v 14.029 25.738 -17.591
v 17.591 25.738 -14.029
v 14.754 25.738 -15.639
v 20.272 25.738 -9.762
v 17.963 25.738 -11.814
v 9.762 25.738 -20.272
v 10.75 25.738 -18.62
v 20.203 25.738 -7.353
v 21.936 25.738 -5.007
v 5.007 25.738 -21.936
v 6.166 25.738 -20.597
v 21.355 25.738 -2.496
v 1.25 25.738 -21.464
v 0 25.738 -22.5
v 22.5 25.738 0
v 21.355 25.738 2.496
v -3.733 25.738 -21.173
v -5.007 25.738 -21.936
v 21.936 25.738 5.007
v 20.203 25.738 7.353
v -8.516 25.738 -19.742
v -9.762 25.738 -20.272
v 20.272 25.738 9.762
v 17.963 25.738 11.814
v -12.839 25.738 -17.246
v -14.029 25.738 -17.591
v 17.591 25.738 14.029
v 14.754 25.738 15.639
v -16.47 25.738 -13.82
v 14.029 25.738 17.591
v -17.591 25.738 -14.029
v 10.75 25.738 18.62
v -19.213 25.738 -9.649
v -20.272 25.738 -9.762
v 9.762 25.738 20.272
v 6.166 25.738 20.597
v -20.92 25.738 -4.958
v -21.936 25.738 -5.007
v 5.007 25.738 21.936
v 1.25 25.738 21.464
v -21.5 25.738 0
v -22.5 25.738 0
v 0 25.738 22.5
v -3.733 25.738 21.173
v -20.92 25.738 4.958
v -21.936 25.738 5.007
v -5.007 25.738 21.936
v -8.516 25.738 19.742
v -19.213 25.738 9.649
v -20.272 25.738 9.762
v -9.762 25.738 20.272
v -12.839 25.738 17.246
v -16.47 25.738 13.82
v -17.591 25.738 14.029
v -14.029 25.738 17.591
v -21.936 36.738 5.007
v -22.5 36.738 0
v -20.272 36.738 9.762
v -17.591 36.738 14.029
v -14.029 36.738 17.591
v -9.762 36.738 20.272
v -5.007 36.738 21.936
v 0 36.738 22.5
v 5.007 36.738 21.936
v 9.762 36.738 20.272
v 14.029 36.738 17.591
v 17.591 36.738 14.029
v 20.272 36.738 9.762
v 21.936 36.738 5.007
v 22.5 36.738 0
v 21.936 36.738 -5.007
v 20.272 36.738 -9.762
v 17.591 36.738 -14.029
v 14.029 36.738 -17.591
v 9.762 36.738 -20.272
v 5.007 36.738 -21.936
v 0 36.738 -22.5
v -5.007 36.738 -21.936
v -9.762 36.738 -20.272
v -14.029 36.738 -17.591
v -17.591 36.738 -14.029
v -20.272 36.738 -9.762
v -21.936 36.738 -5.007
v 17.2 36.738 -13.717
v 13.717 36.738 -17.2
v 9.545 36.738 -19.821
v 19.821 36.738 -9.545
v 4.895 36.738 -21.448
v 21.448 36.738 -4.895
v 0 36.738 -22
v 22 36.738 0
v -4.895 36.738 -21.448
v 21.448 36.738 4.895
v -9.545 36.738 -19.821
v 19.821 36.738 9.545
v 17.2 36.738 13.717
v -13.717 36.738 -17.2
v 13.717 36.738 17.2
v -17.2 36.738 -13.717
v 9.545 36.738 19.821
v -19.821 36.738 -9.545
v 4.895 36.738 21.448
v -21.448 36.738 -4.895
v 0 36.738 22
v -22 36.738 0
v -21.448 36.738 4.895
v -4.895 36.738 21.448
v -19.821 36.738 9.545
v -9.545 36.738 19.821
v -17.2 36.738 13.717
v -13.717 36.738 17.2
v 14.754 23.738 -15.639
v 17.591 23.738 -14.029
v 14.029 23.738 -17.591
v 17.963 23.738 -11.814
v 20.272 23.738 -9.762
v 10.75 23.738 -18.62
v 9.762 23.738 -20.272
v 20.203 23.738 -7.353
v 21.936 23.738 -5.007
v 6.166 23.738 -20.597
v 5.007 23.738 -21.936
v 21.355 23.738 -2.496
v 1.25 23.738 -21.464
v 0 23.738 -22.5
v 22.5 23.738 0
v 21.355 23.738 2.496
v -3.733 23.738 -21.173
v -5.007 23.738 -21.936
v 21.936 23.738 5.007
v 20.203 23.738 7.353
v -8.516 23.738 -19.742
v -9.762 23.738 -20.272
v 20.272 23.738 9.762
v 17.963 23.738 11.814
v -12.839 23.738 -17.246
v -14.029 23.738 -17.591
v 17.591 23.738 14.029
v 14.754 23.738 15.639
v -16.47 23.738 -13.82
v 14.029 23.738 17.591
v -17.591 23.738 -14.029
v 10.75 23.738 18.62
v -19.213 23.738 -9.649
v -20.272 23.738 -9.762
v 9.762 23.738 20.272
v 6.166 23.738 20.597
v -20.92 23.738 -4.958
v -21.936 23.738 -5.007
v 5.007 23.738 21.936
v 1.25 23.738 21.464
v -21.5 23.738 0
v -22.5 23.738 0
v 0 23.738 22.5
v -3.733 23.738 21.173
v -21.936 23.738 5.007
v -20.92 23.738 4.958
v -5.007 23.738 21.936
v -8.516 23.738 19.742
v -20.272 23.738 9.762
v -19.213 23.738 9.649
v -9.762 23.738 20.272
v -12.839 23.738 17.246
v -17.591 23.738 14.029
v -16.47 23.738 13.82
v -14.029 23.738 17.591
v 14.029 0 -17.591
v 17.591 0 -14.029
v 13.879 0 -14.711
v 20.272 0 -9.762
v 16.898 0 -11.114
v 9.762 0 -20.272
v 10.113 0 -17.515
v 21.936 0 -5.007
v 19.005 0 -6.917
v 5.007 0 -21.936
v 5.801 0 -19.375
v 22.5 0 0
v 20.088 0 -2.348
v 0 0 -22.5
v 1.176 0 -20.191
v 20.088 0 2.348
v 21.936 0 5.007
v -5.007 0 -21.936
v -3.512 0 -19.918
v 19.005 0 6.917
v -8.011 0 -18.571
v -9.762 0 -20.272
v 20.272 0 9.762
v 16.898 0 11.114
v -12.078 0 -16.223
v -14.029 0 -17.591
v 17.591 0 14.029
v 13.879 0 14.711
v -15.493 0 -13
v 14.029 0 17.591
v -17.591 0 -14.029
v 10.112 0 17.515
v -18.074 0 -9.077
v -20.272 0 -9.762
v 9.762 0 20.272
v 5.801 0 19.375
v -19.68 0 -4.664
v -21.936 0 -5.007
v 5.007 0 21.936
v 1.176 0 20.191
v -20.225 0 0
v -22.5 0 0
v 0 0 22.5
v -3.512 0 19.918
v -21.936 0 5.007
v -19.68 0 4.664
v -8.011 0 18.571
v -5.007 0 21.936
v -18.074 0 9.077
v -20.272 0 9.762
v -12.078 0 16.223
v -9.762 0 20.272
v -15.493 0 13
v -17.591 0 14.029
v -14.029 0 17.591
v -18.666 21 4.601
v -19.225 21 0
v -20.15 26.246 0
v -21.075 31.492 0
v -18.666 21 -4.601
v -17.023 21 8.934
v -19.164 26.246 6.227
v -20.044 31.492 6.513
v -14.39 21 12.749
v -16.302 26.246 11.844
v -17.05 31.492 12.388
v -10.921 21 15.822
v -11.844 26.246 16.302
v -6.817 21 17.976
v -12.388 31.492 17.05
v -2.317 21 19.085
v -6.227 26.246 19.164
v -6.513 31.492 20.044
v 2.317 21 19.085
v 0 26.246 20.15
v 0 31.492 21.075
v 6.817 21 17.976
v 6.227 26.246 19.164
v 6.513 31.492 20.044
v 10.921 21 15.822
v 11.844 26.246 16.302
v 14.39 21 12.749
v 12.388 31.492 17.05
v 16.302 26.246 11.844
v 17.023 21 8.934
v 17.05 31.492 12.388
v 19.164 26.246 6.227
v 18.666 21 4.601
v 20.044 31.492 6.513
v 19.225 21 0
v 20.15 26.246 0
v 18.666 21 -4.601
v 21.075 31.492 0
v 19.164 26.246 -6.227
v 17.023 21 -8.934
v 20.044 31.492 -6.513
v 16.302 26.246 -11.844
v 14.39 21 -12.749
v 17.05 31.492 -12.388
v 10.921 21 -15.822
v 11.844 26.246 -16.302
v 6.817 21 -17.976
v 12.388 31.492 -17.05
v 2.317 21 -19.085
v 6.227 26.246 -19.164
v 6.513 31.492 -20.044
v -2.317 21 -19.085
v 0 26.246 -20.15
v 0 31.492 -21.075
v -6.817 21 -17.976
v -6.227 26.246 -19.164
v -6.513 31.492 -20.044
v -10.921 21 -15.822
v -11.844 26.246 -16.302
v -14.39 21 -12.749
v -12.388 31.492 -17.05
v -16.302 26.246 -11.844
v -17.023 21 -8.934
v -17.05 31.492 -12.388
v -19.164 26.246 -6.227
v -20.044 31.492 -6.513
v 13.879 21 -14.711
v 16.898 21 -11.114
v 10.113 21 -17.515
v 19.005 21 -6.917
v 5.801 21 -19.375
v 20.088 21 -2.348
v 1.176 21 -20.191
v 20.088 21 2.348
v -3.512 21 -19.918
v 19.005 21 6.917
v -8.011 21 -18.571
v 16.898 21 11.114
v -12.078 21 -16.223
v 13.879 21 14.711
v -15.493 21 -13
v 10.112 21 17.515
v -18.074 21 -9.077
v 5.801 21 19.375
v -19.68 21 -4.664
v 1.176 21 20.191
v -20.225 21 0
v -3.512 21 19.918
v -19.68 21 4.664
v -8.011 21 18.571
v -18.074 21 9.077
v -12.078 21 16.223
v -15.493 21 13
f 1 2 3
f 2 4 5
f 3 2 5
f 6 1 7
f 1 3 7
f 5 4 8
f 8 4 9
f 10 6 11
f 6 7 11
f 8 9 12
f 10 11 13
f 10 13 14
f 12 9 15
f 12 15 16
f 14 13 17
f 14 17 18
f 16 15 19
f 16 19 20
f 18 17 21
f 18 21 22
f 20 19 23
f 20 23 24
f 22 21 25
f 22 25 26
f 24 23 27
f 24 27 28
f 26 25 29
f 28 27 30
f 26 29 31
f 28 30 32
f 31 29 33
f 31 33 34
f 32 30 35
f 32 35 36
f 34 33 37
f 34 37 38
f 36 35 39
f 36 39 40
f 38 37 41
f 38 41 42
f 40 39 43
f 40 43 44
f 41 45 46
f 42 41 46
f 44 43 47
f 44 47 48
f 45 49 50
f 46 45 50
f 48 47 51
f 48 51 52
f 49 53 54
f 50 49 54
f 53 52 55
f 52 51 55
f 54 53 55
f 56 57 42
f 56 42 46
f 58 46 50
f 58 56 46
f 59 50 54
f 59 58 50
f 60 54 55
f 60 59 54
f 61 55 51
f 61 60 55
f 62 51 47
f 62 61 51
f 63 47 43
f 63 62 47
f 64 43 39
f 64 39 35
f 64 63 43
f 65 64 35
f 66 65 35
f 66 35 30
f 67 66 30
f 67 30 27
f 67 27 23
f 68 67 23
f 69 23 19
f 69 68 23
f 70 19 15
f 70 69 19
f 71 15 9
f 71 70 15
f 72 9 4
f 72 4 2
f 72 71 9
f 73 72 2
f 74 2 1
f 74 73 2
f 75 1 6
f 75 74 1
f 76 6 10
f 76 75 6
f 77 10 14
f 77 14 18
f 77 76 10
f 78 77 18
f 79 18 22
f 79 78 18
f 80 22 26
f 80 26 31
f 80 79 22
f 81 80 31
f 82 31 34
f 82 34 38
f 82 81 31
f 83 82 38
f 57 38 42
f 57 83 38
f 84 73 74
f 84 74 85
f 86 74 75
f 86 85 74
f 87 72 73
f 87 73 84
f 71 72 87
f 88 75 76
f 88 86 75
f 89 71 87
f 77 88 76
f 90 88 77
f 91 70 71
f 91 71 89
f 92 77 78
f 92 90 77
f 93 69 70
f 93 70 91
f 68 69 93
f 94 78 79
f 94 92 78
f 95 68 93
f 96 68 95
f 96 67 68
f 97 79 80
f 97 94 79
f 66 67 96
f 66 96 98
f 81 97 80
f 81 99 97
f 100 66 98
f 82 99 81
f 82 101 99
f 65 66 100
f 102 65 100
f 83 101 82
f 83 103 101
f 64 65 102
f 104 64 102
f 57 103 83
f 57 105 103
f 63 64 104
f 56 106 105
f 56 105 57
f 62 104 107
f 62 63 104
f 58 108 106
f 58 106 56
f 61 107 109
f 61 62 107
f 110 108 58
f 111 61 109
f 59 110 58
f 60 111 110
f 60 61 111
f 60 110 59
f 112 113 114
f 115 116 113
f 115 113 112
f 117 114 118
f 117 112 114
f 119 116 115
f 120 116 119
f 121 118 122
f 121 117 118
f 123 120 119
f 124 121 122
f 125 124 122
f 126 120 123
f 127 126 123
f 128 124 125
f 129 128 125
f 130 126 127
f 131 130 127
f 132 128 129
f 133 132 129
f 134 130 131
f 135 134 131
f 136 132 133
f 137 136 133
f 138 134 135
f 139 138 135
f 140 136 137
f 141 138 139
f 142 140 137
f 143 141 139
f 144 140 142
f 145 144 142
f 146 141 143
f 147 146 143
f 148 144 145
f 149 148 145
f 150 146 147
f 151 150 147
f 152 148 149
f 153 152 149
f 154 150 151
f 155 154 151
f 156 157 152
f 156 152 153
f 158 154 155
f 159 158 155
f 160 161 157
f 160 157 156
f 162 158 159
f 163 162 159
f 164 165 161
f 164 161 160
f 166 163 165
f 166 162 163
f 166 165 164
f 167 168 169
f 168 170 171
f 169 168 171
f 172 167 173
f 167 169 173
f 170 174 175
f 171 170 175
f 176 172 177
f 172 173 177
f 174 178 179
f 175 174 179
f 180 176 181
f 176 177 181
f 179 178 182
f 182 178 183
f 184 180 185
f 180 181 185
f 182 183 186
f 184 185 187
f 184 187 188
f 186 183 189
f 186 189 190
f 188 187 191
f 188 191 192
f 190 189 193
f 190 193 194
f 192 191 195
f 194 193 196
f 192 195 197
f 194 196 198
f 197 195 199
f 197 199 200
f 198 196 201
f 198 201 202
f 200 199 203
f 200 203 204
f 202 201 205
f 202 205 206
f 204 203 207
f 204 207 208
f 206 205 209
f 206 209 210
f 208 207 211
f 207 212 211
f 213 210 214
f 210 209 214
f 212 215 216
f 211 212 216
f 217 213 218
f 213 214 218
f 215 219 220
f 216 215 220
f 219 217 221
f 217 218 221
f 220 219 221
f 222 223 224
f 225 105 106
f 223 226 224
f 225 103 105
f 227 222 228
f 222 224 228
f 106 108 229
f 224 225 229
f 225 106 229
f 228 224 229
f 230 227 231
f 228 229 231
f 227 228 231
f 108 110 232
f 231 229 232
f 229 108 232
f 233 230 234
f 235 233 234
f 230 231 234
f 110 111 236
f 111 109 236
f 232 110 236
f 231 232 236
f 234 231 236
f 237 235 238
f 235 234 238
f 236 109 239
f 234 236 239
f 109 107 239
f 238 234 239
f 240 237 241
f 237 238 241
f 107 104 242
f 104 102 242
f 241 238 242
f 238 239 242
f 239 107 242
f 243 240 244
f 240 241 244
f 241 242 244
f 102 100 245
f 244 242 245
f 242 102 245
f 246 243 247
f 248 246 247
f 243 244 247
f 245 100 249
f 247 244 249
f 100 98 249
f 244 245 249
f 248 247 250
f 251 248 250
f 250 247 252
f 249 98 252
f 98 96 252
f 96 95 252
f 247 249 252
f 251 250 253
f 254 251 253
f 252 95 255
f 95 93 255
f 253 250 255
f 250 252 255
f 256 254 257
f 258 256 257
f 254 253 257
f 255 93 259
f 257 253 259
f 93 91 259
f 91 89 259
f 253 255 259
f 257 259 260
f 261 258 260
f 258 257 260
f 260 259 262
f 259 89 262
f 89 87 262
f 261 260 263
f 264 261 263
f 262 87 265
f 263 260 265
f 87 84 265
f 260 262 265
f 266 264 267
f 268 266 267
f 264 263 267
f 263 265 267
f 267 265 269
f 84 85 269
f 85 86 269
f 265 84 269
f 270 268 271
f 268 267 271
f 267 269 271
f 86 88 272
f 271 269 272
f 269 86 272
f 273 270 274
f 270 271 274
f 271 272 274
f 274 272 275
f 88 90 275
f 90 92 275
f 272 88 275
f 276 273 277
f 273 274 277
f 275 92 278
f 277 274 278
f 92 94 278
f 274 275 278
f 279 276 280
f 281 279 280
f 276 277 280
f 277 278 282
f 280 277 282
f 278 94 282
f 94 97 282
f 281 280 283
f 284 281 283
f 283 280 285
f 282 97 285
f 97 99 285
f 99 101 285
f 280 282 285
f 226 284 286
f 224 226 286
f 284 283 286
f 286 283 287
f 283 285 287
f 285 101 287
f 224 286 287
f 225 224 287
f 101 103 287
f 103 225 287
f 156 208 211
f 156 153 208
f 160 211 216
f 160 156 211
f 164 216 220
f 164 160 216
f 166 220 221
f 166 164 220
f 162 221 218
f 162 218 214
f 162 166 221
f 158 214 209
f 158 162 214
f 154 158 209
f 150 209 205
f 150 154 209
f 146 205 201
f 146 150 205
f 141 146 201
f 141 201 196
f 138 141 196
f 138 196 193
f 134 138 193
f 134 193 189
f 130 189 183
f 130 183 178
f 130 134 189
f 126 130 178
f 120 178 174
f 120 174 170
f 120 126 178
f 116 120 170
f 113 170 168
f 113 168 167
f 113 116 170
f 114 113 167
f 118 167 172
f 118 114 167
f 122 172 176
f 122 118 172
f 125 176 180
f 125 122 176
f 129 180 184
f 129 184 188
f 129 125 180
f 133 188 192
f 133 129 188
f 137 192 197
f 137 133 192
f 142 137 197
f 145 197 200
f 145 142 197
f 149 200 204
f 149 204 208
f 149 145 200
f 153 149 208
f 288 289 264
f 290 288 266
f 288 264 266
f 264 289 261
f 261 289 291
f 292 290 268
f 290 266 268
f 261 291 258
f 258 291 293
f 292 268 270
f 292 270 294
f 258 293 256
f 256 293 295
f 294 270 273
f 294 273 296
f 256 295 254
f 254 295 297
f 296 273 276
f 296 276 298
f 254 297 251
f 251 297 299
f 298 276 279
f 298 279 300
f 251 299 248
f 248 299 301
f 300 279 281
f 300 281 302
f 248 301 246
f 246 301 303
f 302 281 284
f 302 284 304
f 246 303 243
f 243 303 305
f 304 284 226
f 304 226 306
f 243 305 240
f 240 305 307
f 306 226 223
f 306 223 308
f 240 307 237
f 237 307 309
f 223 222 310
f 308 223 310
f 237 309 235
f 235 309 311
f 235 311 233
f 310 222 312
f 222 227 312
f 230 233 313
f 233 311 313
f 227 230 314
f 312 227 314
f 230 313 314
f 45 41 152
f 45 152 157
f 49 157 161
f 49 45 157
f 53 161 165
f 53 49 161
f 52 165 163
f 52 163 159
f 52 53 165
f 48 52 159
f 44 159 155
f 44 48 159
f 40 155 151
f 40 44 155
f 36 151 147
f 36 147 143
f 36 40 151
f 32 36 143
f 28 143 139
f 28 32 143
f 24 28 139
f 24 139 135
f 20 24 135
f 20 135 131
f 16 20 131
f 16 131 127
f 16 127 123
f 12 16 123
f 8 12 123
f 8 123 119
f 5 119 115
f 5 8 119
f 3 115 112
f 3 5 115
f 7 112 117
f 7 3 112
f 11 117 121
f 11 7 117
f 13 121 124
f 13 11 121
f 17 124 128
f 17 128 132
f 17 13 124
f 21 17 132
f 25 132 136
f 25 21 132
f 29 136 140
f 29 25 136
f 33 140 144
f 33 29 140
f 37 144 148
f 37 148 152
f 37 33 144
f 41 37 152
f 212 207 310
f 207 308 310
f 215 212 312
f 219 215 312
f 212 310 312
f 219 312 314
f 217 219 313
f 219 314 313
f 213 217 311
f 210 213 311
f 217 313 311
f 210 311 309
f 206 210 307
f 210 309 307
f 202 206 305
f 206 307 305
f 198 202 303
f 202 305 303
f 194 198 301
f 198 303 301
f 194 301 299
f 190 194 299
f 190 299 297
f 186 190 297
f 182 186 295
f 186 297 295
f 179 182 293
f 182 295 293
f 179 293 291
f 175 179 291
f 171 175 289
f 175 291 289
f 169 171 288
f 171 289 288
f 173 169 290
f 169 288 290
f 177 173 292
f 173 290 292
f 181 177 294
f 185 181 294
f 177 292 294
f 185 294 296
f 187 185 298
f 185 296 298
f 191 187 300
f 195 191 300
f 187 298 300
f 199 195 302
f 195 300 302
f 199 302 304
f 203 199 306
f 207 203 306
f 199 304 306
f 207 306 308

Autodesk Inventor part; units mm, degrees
ref_plane "YZ Plane" through (0, 0, 0) normal (1, 0, 0) x (0, 1, 0)
ref_plane "XZ Plane" through (0, 0, 0) normal (0, 1, 0) x (-1, 0, 0)
ref_plane "XY Plane" through (0, 0, 0) normal (0, 0, 1) x (1, 0, 0)
sketch "Sketch1" plane through (0, 0, 0) normal (0, 0, 1) x (1, 0, 0)
  line L0 (-19.225, -30) -> (-22.225, -30) construction
  line L1 (-22.225, -30) -> (-22.225, -20) construction
  line L2 (-22.225, -20) -> (-19.225, -20) construction
  line L3 (-19.225, -20) -> (-19.225, -30) construction
  line L4 (-22, 36.7378) -> (-19.225, 21)
  line L5 (-22.5, 0) -> (-22.5, 23.7378)
  line L6 (-22.5, 23.7378) -> (-21.5, 23.7378)
  line L7 (-21.5, 23.7378) -> (-21.5, 25.7378)
  line L8 (-21.5, 25.7378) -> (-22.5, 25.7378)
  line L9 (-22.5, 25.7378) -> (-22.5, 36.7378)
  line L10 (-22, 36.7378) -> (-22.5, 36.7378)
  line L11 (0, -43.3476) -> (0, 50.0854) projected
  line L12 (-19.225, -20) -> (-20.225, -20) construction
  line L13 (-20.225, -20) -> (-20.225, 0) construction
  line L14 (-20.225, 0) -> (-19.225, 0) construction
  line L15 (-19.225, 0) -> (-19.225, -20) construction
  line L16 (-22.5, 0) -> (-20.225, 0)
  line L17 (-20.225, 0) -> (-20.225, 21)
  line L18 (-20.225, 21) -> (-19.225, 21)
  point P0 (0, 0)
  dimension "d0" = 10
  dimension "d1" = 22.225
  dimension "d3" = 3
  dimension "d5" = 11
  dimension "d6" = 2
  dimension "d7" = 22.5
  dimension "d10" = 21
  dimension "d12" = 1
  dimension "d16" = 20
  dimension "d17" = 1
  dimension "d18" = 0.5
  dimension "d19" = 10
revolve "Revolution1" add sketch "Sketch1" angle 360 about axis through (0, -10, 0) along (0, 1, 0)
properties part number "CapCone" material "Brass, Soft Yellow, Welded"
